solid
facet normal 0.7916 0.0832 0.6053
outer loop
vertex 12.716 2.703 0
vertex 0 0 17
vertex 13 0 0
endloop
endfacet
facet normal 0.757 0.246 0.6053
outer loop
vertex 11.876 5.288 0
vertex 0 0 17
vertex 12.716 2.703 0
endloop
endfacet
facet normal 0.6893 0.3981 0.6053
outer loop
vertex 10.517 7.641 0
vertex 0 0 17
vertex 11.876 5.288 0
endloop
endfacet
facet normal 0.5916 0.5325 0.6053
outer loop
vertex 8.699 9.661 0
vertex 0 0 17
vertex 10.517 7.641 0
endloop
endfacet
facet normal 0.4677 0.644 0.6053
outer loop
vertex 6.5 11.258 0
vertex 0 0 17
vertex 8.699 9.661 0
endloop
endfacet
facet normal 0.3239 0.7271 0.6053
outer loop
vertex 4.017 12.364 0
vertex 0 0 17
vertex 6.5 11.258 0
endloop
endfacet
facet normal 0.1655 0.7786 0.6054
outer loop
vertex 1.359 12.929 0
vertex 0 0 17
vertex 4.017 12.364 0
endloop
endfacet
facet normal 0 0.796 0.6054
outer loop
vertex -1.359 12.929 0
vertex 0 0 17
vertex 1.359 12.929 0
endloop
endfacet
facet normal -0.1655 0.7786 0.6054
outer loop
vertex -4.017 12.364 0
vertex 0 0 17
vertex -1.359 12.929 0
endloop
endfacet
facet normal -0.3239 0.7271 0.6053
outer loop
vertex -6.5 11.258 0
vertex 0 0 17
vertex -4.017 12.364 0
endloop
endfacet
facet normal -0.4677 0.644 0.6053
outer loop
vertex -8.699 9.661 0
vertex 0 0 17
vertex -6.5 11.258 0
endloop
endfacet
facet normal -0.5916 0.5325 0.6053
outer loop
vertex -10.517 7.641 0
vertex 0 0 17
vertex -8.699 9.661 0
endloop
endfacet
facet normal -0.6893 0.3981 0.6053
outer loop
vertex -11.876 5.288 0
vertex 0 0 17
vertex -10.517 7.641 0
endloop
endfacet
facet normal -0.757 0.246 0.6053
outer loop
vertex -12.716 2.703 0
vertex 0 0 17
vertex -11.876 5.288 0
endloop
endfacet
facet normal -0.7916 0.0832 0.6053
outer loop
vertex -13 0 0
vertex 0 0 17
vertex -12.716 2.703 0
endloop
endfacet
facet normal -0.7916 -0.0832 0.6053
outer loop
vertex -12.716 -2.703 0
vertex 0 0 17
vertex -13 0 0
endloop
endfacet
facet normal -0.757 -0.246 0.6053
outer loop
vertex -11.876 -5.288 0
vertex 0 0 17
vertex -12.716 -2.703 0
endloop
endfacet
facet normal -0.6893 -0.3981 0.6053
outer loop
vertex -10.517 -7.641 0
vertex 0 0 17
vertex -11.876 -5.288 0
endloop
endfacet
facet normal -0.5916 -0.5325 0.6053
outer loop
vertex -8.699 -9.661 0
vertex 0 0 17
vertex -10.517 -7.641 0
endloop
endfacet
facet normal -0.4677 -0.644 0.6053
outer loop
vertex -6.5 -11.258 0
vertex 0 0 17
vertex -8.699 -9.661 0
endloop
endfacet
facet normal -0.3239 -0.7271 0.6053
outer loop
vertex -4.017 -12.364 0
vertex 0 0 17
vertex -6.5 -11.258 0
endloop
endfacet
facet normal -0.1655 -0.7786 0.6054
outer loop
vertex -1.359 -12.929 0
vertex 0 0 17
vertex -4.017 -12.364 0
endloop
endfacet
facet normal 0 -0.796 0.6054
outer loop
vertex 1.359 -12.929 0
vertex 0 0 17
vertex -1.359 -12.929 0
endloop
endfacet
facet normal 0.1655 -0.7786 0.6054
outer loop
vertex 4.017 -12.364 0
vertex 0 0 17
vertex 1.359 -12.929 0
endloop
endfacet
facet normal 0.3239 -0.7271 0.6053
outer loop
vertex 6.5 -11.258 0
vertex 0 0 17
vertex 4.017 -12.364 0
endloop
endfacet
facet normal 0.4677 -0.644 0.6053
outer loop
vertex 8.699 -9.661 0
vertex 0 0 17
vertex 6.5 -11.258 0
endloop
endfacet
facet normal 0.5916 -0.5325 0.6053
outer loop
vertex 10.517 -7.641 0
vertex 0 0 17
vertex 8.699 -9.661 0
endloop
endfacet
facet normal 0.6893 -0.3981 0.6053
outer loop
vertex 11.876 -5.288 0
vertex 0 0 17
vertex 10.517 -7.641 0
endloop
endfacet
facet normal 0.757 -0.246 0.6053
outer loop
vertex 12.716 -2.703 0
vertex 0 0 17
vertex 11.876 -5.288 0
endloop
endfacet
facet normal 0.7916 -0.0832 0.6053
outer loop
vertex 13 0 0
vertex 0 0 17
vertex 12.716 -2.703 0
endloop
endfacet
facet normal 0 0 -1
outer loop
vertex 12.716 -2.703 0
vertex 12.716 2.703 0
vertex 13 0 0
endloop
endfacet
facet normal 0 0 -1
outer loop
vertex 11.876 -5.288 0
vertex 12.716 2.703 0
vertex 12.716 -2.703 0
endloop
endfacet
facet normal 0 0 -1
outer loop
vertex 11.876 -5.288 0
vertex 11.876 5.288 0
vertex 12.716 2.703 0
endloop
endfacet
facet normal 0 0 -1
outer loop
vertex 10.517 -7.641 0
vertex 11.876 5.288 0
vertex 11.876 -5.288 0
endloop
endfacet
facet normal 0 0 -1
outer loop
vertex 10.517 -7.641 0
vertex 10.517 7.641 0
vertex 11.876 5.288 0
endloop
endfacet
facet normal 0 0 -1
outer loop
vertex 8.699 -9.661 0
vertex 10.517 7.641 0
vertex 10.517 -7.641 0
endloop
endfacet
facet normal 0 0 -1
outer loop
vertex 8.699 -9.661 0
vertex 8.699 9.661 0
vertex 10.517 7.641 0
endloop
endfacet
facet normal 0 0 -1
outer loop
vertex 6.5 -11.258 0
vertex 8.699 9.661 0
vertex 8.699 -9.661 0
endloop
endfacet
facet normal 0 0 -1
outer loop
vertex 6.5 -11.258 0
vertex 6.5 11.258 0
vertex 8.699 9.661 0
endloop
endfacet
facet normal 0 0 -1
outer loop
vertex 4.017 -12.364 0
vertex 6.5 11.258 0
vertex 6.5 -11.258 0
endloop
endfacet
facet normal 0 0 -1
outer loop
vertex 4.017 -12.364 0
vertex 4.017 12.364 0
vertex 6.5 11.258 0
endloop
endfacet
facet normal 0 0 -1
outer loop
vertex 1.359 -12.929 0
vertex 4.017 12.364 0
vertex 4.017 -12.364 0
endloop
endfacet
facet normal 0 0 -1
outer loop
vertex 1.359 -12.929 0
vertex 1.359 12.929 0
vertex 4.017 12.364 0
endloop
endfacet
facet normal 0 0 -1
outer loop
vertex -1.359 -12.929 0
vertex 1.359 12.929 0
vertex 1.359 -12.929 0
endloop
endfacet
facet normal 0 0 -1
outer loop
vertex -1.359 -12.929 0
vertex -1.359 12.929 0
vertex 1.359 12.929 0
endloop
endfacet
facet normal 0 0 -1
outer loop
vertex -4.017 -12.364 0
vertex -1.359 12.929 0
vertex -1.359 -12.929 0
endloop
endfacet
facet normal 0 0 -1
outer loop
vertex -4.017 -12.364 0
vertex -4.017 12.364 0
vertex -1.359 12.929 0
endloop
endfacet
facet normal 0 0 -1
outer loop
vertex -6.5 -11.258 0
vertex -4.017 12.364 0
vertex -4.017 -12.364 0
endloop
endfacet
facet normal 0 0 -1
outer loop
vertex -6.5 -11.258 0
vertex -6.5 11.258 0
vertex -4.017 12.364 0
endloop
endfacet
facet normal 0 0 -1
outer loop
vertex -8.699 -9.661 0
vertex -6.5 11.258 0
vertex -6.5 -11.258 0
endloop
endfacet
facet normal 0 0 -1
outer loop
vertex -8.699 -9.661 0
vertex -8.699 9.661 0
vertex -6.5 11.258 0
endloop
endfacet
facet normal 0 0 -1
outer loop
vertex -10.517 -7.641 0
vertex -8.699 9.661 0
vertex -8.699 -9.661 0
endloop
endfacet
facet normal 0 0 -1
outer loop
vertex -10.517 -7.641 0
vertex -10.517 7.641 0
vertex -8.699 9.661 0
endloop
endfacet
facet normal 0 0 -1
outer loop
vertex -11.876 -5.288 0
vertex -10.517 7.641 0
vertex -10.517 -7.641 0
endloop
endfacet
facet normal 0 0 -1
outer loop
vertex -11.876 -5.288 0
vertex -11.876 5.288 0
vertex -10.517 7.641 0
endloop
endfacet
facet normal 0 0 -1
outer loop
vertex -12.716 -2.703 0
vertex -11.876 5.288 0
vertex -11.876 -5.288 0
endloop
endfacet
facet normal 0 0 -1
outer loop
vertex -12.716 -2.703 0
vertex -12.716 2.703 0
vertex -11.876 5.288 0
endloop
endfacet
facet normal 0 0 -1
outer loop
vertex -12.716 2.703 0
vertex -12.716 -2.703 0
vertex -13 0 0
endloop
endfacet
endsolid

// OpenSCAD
// Generated by SolidPython 1.0.1 on 2020-07-29 00:46:43


cylinder(h = 17, r1 = 13, r2 = 0);
/***********************************************
*********      SolidPython code:      **********
************************************************
 
# import packages: SolidPython
from solid import *
from solid.utils import *
from itertools import chain, combinations, permutations


class Resize:

    def __init__(self, scad_file):
        self.scad_file = scad_file
        #self.scad_file = import_scad(scad_file)
        # cone/cylinder param:
        self.r1 = 0
        self.r2 = 0
        self.h = 0
        # rectangular prism param:
        self.w = 0
        self.l = 0
        # ellipse param:
        self.r = 0

    # import OpenScad code (file name corresponds to shape)


    # classify shape + parameters
    def assign(self, param1, param2, param3):
        if self.scad_file == 'cone.scad':
            self.r1 = param1
            self.r2 = param2
            self.h = param3
        elif self.scad_file == 'cylinder.scad':
            self.r1 = param1
            self.r2 = param2
            self.h = param3
        elif self.scad_file == 'rectangularPrism.scad':
            self.h = param1
            self.l = param2
            self.w = param3
        else:
            self.r = param1
            self.h = param2

    # resize parameters
    def iterate(self):
        x = range(3, 20, 2)
        i = 1
        if self.scad_file == 'cone.scad':
            tempList = list(permutations(x, 2))
            for temp in tempList:
                param1 = temp[0]
                param2 = temp[1]
                filepath = 'produced_scad_files/' + 'cone' + str(param1) + '_' + str(param2) + '_' + '.scad'
                scad_render_to_file(cylinder(h=param1, r1=param2, r2=0), filepath)

        elif self.scad_file == 'cylinder.scad':
            tempList = list(permutations(x, 3))
            for temp in tempList:
                param1 = temp[0]
                param2 = temp[1]
                filepath = 'produced_scad_files/' + 'cylinder' + str(param1) + '_' + str(param2) + '_' + '.scad'
                scad_render_to_file(cylinder(h=param1, r1=param2, r2=param2), filepath)

        elif self.scad_file == 'rectangularPrism.scad':
            tempList = list(permutations(x, 3))
            for temp in tempList:
                param1 = temp[0]
                param2 = temp[1]
                param3 = temp[2]
                filepath = 'produced_scad_files/' + 'rectangularPrism' + str(param1) + '_' + str(param2) + '_' + str(
                    param3) + '.scad'
                scad_render_to_file(cube(size=(param1, param2, param3)), filepath)

        elif self.scad_file == 'ellipse.scad':
            tempList = list(permutations(x, 4))
            for temp in tempList:
                param1 = temp[0]
                param2 = temp[1]
                param3 = temp[2]
                param4 = temp[3]
                filepath = 'produced_scad_files/' + 'ellipse' + str(param1) + '_' + str(param2) + '_' + str(param3) + '_' + str(param4) + '.scad'
                scad_render_to_file(scale([param1, param2, param3])(sphere(r=param4)), filepath)

    def render_to_scadfile(self):
        scad_render_to_file(scad, 'example.scad') 
 
************************************************/
